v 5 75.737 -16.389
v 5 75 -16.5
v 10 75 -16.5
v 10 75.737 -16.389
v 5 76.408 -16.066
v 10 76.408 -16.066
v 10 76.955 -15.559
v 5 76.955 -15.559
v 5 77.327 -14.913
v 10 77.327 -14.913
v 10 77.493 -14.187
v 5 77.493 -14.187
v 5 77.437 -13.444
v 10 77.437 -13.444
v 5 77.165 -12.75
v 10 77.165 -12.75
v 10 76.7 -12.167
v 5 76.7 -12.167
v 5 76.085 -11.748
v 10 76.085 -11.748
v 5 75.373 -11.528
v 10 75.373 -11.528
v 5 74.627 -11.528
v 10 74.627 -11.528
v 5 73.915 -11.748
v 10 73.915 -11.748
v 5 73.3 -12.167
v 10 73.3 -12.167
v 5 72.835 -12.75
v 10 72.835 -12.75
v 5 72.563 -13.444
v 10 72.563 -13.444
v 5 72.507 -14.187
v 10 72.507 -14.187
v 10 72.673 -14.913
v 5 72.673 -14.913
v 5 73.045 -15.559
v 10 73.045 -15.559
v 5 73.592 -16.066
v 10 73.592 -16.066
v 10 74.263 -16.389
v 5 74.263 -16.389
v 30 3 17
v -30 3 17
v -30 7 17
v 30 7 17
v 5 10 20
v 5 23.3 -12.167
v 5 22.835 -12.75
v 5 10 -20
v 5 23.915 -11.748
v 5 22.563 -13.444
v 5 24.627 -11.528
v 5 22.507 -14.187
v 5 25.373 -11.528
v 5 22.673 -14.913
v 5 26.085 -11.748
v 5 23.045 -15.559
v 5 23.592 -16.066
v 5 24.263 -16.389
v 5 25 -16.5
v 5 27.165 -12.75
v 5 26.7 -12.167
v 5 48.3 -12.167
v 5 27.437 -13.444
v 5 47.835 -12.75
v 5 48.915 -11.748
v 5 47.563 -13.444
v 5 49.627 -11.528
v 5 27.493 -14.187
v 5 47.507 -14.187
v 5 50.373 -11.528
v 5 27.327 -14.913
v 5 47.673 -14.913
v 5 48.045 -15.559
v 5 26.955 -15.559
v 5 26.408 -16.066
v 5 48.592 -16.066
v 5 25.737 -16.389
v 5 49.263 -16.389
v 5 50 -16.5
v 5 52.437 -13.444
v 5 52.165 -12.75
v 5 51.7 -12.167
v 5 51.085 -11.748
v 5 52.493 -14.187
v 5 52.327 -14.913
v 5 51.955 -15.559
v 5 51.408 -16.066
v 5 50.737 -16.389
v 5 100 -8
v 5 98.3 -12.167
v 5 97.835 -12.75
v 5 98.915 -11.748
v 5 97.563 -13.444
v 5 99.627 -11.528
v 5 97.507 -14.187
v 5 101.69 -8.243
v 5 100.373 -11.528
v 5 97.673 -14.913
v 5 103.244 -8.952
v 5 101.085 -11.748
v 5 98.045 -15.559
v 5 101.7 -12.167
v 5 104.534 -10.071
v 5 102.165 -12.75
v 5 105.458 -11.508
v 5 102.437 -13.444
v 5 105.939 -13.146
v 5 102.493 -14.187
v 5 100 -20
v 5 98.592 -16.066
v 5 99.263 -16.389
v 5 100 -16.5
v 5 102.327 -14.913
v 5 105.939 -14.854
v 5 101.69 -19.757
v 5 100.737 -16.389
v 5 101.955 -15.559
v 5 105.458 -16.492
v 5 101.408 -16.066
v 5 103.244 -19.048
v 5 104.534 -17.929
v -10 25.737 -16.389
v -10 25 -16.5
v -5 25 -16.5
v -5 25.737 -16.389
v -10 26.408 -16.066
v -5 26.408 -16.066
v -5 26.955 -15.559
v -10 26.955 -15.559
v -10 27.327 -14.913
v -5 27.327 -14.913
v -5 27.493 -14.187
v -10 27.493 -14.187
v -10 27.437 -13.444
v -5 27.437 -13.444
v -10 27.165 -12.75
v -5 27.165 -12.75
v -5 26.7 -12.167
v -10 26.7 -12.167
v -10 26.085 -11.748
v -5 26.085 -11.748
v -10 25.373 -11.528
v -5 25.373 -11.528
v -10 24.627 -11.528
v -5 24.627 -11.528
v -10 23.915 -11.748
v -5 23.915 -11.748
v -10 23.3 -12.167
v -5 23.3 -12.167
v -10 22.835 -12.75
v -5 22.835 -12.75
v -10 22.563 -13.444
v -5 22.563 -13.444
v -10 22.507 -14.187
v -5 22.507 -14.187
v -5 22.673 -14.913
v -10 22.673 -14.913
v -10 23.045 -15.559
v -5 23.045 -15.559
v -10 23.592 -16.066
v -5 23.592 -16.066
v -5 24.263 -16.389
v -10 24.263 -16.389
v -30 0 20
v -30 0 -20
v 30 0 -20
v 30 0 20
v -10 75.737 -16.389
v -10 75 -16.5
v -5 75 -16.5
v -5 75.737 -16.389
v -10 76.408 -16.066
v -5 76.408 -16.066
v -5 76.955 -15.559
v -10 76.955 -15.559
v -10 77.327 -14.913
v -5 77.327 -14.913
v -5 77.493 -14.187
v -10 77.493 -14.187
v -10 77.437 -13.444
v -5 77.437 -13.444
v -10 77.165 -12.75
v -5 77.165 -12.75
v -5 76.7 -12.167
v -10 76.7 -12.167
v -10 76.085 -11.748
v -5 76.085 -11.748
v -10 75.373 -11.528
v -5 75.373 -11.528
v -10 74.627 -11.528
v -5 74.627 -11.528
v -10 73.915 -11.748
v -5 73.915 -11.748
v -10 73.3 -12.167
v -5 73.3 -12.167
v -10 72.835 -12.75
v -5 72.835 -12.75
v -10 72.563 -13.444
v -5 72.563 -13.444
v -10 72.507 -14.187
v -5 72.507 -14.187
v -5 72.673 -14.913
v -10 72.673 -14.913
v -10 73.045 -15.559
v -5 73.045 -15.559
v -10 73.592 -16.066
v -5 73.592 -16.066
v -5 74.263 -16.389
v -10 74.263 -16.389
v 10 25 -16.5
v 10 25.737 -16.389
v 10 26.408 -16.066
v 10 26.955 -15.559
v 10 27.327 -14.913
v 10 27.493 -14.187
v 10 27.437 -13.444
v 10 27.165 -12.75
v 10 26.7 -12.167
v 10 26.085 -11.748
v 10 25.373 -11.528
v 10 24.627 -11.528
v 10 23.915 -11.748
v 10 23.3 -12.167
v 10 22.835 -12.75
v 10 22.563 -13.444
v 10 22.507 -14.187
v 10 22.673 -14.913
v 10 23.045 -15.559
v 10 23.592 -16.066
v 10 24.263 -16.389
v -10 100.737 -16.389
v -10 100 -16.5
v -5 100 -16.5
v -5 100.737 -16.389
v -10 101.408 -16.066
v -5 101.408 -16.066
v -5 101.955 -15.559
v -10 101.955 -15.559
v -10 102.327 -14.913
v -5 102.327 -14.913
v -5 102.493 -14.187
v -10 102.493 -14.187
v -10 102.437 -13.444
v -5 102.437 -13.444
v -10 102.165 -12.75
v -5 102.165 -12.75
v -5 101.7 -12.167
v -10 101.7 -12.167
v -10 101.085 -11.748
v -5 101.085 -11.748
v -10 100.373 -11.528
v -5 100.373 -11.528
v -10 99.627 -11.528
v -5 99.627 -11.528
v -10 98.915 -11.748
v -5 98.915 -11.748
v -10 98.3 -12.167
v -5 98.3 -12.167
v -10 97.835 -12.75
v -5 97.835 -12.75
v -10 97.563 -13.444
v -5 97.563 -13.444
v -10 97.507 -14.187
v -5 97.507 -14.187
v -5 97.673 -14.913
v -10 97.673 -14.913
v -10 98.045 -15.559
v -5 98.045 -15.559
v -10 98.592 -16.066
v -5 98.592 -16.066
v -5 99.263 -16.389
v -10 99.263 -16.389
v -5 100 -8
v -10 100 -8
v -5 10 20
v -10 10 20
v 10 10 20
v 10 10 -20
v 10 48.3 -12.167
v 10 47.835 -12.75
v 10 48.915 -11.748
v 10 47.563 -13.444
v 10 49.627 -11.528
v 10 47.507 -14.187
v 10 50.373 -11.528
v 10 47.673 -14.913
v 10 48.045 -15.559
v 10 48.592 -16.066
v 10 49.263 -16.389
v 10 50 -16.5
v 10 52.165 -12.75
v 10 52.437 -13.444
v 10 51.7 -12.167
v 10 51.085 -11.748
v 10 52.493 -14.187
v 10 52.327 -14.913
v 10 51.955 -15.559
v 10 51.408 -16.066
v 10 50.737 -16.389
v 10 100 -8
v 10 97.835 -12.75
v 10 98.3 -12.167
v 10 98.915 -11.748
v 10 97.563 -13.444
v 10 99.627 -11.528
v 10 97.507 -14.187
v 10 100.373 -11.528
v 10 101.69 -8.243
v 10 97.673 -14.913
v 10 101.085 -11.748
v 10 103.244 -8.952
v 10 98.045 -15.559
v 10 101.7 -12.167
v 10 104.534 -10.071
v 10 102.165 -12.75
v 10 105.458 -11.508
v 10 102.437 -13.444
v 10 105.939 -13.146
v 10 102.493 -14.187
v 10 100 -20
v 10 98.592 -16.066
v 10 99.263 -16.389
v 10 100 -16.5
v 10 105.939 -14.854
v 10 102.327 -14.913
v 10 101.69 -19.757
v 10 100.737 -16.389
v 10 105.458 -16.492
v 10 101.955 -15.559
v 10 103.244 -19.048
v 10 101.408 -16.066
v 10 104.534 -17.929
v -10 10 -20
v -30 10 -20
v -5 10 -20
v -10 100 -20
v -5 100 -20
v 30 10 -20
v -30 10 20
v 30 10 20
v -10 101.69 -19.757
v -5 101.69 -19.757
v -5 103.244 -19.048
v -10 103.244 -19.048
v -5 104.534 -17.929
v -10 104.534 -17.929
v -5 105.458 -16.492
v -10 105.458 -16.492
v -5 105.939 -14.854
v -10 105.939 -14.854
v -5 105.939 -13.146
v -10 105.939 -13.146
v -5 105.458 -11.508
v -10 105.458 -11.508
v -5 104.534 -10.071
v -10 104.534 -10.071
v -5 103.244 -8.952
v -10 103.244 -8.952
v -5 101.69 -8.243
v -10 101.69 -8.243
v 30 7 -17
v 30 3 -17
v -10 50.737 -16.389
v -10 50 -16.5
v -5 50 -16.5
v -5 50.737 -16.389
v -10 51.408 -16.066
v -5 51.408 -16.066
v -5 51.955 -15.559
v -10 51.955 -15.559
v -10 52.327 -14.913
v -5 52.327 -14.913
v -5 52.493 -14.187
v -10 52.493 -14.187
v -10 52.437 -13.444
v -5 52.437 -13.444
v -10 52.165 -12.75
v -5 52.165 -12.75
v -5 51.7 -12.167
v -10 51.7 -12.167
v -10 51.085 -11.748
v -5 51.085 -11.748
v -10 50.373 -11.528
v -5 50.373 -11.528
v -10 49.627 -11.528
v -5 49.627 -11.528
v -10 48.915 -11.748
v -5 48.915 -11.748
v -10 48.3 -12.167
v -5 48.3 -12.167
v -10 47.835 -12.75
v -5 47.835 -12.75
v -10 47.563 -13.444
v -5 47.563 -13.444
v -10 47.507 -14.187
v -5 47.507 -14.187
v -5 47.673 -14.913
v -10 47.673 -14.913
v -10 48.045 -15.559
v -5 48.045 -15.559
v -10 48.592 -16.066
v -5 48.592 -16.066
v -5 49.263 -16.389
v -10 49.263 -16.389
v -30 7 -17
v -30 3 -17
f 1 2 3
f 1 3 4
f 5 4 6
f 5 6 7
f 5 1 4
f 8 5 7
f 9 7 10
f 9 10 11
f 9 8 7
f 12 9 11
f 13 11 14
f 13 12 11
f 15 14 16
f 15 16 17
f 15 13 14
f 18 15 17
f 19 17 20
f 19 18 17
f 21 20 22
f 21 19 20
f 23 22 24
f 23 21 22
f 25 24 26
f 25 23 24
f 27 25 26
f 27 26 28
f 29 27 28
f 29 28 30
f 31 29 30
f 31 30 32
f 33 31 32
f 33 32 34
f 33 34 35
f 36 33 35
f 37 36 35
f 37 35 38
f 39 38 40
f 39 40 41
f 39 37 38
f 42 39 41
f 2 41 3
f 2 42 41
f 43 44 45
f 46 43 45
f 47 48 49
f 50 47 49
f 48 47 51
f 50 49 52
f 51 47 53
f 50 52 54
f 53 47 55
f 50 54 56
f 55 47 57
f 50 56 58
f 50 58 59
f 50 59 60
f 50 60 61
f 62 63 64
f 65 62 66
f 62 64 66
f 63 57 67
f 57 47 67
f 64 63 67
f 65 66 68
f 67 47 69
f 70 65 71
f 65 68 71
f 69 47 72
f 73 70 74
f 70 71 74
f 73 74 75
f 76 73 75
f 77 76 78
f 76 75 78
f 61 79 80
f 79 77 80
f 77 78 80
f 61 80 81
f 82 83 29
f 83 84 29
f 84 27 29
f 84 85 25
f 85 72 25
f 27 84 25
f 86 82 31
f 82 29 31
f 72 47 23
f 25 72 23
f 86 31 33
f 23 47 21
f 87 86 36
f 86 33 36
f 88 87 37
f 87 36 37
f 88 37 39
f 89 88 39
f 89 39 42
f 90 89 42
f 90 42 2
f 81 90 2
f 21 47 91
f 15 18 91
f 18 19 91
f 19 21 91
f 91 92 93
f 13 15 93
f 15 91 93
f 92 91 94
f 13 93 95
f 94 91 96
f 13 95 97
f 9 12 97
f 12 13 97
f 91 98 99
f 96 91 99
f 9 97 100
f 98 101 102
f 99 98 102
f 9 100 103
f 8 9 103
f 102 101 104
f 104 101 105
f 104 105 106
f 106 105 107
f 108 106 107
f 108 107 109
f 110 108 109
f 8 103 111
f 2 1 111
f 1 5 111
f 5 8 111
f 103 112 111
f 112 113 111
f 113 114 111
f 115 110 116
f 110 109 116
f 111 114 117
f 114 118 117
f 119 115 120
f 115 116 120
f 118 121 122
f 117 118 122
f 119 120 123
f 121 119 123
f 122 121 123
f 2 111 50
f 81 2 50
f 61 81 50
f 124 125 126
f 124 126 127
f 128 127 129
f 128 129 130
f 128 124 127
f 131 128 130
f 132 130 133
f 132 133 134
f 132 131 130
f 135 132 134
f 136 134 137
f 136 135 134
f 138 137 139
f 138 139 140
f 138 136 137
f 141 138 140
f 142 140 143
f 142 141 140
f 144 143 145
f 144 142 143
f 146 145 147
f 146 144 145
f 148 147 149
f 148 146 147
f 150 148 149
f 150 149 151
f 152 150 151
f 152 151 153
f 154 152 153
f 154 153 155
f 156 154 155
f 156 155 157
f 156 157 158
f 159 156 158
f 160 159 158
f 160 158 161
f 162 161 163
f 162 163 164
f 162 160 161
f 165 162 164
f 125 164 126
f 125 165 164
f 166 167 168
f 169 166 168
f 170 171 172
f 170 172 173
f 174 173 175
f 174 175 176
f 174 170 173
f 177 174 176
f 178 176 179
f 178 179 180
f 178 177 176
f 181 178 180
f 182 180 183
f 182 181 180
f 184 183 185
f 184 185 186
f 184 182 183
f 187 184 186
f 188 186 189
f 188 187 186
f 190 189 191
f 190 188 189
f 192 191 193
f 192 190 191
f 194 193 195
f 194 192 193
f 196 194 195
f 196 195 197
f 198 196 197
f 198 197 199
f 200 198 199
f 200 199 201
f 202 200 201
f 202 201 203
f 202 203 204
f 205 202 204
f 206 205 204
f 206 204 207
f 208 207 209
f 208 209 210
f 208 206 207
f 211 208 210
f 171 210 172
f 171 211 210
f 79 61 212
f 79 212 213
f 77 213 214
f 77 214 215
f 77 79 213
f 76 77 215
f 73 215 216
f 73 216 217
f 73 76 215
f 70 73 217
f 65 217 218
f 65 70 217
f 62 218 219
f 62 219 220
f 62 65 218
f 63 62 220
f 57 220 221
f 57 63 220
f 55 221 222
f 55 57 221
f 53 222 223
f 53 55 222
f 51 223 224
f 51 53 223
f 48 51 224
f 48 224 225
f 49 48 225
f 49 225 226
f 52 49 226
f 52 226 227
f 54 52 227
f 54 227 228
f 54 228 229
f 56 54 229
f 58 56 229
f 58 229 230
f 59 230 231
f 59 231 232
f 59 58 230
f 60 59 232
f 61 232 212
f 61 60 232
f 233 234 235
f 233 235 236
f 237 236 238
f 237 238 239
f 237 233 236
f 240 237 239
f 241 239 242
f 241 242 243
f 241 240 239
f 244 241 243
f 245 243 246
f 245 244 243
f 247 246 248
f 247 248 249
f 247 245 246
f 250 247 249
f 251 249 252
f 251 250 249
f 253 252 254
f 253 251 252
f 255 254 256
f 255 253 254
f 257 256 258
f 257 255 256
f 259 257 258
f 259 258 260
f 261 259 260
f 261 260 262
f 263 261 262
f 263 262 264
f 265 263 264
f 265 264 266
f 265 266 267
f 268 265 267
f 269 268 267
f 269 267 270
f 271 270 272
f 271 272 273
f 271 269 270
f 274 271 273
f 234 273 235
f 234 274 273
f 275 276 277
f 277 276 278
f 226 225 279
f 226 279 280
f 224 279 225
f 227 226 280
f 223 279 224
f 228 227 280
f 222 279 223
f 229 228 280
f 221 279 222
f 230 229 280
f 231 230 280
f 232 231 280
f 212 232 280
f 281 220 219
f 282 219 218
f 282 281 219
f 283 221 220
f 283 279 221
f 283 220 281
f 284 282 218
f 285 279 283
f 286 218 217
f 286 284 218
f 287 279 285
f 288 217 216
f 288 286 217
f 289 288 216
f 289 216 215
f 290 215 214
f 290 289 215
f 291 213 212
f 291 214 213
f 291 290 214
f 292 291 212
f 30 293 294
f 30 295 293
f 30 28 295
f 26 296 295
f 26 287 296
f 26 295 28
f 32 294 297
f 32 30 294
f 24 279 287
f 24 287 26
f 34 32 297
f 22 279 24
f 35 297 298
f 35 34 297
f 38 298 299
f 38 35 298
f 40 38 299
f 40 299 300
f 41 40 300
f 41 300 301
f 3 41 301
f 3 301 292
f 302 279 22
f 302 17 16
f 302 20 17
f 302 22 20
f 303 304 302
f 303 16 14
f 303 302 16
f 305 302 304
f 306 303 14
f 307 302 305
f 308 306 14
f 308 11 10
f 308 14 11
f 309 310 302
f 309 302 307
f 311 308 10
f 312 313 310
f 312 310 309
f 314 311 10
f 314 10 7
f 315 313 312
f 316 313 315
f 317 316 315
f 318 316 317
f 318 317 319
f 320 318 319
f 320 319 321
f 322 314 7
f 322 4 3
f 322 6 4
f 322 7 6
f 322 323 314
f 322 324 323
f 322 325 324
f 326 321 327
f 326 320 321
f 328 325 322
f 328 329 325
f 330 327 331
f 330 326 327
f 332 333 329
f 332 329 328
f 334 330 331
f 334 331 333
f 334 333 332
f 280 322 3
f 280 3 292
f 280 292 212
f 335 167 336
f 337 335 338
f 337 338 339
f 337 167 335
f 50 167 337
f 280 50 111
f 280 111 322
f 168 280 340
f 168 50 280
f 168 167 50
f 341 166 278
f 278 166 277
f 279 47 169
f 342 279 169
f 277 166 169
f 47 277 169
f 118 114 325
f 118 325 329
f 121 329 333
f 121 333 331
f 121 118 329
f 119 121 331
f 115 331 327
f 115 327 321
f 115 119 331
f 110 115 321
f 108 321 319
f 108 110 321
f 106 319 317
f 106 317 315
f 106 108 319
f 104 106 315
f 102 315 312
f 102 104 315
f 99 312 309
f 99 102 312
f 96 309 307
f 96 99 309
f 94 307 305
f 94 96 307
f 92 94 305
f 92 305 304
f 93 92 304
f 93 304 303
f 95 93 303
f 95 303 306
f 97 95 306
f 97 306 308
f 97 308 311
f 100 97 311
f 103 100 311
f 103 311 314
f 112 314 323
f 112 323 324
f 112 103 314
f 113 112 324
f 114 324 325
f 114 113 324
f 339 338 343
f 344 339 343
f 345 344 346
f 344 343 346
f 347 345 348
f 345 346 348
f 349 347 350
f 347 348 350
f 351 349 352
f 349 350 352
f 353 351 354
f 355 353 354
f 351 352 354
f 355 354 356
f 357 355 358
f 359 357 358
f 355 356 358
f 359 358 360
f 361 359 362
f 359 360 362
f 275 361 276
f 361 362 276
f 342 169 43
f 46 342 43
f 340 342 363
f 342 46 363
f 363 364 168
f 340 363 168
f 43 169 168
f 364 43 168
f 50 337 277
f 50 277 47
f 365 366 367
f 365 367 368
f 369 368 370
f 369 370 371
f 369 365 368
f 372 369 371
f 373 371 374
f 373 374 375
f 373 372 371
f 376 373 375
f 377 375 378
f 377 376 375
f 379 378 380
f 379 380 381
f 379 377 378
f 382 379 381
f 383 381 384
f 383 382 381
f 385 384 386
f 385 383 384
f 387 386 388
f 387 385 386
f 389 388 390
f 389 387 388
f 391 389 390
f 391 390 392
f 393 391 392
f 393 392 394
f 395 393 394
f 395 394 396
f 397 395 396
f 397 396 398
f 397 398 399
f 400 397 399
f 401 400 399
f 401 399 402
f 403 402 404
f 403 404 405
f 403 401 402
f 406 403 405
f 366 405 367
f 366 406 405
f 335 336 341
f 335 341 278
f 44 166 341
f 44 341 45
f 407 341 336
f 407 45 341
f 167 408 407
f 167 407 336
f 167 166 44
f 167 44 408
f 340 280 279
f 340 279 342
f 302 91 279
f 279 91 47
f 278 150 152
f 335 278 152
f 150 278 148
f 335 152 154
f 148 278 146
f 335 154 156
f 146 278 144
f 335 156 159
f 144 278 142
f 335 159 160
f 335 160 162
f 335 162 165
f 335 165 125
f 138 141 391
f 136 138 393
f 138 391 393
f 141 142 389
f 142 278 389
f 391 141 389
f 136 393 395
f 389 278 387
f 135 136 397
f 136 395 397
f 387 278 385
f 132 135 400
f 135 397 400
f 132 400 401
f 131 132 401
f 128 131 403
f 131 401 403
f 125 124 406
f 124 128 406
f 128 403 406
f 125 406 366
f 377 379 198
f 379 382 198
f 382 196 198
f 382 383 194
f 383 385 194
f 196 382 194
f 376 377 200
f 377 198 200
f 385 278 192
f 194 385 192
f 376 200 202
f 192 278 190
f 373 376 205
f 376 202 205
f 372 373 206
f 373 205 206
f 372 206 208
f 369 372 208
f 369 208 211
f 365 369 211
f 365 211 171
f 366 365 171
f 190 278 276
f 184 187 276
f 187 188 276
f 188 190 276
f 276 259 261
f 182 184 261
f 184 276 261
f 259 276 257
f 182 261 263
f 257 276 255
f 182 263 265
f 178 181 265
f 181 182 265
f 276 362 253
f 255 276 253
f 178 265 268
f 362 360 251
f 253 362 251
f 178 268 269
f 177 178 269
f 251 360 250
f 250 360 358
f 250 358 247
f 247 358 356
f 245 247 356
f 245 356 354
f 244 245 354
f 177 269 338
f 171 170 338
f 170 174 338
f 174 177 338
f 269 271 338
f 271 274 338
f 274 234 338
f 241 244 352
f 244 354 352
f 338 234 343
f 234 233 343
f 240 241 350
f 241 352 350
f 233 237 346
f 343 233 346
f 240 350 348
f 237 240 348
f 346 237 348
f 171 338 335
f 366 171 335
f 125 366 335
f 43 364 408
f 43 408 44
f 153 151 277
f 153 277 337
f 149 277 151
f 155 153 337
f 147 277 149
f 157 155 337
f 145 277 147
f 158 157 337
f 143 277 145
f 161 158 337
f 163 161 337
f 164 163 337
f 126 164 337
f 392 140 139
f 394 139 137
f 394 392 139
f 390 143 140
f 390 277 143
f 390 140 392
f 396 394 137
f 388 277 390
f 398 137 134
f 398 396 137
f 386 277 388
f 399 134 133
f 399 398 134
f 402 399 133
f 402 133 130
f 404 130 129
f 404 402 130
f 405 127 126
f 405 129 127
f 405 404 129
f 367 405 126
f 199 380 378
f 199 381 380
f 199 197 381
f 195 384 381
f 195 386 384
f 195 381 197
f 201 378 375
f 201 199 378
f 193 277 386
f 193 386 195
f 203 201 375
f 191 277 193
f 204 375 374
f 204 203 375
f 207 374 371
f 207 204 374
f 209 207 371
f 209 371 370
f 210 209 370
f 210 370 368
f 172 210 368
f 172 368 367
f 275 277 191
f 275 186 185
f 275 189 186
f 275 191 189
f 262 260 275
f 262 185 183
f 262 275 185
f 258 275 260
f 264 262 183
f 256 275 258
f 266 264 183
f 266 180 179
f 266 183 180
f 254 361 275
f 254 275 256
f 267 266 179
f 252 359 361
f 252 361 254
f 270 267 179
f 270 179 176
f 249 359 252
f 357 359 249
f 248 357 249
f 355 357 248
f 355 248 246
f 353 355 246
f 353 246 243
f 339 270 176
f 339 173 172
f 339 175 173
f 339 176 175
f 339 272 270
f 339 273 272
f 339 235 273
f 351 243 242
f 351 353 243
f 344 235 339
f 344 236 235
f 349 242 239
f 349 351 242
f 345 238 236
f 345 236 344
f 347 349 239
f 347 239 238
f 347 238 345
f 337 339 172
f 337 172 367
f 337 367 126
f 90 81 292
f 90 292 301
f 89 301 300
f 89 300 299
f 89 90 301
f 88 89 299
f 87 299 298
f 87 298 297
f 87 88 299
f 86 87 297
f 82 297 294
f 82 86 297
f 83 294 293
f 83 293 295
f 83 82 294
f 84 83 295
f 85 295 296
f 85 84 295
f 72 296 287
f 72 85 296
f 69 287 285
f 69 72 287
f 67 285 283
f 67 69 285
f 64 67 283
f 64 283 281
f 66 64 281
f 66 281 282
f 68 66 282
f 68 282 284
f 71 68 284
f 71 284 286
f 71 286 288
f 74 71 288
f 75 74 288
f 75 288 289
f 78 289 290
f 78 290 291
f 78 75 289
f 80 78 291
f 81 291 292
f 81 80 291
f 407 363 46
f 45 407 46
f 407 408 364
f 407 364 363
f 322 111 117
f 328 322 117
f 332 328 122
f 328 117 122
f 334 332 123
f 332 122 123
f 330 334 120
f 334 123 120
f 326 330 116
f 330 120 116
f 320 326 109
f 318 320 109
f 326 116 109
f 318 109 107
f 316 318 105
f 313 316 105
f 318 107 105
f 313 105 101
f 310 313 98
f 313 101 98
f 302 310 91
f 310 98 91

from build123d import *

# Parameters (mm, degrees)
SKETCH1_W           = 60
SKETCH1_H           = 40
BOSS_EXTRUDE1_DEPTH = 10
BOSS_EXTRUDE2_START = 5
SKETCH2_R           = 2.5
BOSS_EXTRUDE2_DEPTH = 5
BOSS_EXTRUDE3_START = -10
SKETCH2_3_R         = 2.5
BOSS_EXTRUDE3_DEPTH = 5
SKETCH3_W           = 34
SKETCH3_H           = 4
CUT_EXTRUDE1_DEPTH  = 124.434192994


with BuildPart() as part:
    # Sketch1 → Boss-Extrude1 (new body)
    with BuildSketch(Plane(origin=(0, 0, 0), x_dir=(1, 0, 0), z_dir=(0, 1, 0))):
        Rectangle(SKETCH1_W, SKETCH1_H)
    extrude(amount=BOSS_EXTRUDE1_DEPTH)

    # Sketch2 → Boss-Extrude2 (add)
    with BuildSketch(Plane(origin=(0, 0, 0), x_dir=(0, 0, -1), z_dir=(1, 0, 0)).offset(BOSS_EXTRUDE2_START)):
        with BuildLine():
            Line((20, 10), (20, 100))
            ThreePointArc((20, 100), (14, 106), (8, 100))
            Line((8, 100), (-20, 10))
            Line((-20, 10), (20, 10))
        make_face()
        with Locations((14, 25)):
            Circle(SKETCH2_R, mode=Mode.SUBTRACT)
        with Locations((14, 50)):
            Circle(SKETCH2_R, mode=Mode.SUBTRACT)
        with Locations((14, 75)):
            Circle(SKETCH2_R, mode=Mode.SUBTRACT)
        with Locations((14, 100)):
            Circle(SKETCH2_R, mode=Mode.SUBTRACT)
    extrude(amount=BOSS_EXTRUDE2_DEPTH)

    # Sketch2<3> → Boss-Extrude3 (add)
    with BuildSketch(Plane(origin=(0, 0, 0), x_dir=(0, 0, -1), z_dir=(1, 0, 0)).offset(BOSS_EXTRUDE3_START)):
        with BuildLine():
            Line((20, 10), (20, 100))
            ThreePointArc((20, 100), (14, 106), (8, 100))
            Line((8, 100), (-20, 10))
            Line((-20, 10), (20, 10))
        make_face()
        with Locations((14, 25)):
            Circle(SKETCH2_3_R, mode=Mode.SUBTRACT)
        with Locations((14, 50)):
            Circle(SKETCH2_3_R, mode=Mode.SUBTRACT)
        with Locations((14, 75)):
            Circle(SKETCH2_3_R, mode=Mode.SUBTRACT)
        with Locations((14, 100)):
            Circle(SKETCH2_3_R, mode=Mode.SUBTRACT)
    extrude(amount=BOSS_EXTRUDE3_DEPTH)

    # Sketch3 → Cut-Extrude1 (cut, through all)
    with BuildSketch(Plane.ZY.offset(30)):
        with Locations((0, 5)):
            Rectangle(SKETCH3_W, SKETCH3_H)
    extrude(amount=-CUT_EXTRUDE1_DEPTH, mode=Mode.SUBTRACT)


solid = part.part
